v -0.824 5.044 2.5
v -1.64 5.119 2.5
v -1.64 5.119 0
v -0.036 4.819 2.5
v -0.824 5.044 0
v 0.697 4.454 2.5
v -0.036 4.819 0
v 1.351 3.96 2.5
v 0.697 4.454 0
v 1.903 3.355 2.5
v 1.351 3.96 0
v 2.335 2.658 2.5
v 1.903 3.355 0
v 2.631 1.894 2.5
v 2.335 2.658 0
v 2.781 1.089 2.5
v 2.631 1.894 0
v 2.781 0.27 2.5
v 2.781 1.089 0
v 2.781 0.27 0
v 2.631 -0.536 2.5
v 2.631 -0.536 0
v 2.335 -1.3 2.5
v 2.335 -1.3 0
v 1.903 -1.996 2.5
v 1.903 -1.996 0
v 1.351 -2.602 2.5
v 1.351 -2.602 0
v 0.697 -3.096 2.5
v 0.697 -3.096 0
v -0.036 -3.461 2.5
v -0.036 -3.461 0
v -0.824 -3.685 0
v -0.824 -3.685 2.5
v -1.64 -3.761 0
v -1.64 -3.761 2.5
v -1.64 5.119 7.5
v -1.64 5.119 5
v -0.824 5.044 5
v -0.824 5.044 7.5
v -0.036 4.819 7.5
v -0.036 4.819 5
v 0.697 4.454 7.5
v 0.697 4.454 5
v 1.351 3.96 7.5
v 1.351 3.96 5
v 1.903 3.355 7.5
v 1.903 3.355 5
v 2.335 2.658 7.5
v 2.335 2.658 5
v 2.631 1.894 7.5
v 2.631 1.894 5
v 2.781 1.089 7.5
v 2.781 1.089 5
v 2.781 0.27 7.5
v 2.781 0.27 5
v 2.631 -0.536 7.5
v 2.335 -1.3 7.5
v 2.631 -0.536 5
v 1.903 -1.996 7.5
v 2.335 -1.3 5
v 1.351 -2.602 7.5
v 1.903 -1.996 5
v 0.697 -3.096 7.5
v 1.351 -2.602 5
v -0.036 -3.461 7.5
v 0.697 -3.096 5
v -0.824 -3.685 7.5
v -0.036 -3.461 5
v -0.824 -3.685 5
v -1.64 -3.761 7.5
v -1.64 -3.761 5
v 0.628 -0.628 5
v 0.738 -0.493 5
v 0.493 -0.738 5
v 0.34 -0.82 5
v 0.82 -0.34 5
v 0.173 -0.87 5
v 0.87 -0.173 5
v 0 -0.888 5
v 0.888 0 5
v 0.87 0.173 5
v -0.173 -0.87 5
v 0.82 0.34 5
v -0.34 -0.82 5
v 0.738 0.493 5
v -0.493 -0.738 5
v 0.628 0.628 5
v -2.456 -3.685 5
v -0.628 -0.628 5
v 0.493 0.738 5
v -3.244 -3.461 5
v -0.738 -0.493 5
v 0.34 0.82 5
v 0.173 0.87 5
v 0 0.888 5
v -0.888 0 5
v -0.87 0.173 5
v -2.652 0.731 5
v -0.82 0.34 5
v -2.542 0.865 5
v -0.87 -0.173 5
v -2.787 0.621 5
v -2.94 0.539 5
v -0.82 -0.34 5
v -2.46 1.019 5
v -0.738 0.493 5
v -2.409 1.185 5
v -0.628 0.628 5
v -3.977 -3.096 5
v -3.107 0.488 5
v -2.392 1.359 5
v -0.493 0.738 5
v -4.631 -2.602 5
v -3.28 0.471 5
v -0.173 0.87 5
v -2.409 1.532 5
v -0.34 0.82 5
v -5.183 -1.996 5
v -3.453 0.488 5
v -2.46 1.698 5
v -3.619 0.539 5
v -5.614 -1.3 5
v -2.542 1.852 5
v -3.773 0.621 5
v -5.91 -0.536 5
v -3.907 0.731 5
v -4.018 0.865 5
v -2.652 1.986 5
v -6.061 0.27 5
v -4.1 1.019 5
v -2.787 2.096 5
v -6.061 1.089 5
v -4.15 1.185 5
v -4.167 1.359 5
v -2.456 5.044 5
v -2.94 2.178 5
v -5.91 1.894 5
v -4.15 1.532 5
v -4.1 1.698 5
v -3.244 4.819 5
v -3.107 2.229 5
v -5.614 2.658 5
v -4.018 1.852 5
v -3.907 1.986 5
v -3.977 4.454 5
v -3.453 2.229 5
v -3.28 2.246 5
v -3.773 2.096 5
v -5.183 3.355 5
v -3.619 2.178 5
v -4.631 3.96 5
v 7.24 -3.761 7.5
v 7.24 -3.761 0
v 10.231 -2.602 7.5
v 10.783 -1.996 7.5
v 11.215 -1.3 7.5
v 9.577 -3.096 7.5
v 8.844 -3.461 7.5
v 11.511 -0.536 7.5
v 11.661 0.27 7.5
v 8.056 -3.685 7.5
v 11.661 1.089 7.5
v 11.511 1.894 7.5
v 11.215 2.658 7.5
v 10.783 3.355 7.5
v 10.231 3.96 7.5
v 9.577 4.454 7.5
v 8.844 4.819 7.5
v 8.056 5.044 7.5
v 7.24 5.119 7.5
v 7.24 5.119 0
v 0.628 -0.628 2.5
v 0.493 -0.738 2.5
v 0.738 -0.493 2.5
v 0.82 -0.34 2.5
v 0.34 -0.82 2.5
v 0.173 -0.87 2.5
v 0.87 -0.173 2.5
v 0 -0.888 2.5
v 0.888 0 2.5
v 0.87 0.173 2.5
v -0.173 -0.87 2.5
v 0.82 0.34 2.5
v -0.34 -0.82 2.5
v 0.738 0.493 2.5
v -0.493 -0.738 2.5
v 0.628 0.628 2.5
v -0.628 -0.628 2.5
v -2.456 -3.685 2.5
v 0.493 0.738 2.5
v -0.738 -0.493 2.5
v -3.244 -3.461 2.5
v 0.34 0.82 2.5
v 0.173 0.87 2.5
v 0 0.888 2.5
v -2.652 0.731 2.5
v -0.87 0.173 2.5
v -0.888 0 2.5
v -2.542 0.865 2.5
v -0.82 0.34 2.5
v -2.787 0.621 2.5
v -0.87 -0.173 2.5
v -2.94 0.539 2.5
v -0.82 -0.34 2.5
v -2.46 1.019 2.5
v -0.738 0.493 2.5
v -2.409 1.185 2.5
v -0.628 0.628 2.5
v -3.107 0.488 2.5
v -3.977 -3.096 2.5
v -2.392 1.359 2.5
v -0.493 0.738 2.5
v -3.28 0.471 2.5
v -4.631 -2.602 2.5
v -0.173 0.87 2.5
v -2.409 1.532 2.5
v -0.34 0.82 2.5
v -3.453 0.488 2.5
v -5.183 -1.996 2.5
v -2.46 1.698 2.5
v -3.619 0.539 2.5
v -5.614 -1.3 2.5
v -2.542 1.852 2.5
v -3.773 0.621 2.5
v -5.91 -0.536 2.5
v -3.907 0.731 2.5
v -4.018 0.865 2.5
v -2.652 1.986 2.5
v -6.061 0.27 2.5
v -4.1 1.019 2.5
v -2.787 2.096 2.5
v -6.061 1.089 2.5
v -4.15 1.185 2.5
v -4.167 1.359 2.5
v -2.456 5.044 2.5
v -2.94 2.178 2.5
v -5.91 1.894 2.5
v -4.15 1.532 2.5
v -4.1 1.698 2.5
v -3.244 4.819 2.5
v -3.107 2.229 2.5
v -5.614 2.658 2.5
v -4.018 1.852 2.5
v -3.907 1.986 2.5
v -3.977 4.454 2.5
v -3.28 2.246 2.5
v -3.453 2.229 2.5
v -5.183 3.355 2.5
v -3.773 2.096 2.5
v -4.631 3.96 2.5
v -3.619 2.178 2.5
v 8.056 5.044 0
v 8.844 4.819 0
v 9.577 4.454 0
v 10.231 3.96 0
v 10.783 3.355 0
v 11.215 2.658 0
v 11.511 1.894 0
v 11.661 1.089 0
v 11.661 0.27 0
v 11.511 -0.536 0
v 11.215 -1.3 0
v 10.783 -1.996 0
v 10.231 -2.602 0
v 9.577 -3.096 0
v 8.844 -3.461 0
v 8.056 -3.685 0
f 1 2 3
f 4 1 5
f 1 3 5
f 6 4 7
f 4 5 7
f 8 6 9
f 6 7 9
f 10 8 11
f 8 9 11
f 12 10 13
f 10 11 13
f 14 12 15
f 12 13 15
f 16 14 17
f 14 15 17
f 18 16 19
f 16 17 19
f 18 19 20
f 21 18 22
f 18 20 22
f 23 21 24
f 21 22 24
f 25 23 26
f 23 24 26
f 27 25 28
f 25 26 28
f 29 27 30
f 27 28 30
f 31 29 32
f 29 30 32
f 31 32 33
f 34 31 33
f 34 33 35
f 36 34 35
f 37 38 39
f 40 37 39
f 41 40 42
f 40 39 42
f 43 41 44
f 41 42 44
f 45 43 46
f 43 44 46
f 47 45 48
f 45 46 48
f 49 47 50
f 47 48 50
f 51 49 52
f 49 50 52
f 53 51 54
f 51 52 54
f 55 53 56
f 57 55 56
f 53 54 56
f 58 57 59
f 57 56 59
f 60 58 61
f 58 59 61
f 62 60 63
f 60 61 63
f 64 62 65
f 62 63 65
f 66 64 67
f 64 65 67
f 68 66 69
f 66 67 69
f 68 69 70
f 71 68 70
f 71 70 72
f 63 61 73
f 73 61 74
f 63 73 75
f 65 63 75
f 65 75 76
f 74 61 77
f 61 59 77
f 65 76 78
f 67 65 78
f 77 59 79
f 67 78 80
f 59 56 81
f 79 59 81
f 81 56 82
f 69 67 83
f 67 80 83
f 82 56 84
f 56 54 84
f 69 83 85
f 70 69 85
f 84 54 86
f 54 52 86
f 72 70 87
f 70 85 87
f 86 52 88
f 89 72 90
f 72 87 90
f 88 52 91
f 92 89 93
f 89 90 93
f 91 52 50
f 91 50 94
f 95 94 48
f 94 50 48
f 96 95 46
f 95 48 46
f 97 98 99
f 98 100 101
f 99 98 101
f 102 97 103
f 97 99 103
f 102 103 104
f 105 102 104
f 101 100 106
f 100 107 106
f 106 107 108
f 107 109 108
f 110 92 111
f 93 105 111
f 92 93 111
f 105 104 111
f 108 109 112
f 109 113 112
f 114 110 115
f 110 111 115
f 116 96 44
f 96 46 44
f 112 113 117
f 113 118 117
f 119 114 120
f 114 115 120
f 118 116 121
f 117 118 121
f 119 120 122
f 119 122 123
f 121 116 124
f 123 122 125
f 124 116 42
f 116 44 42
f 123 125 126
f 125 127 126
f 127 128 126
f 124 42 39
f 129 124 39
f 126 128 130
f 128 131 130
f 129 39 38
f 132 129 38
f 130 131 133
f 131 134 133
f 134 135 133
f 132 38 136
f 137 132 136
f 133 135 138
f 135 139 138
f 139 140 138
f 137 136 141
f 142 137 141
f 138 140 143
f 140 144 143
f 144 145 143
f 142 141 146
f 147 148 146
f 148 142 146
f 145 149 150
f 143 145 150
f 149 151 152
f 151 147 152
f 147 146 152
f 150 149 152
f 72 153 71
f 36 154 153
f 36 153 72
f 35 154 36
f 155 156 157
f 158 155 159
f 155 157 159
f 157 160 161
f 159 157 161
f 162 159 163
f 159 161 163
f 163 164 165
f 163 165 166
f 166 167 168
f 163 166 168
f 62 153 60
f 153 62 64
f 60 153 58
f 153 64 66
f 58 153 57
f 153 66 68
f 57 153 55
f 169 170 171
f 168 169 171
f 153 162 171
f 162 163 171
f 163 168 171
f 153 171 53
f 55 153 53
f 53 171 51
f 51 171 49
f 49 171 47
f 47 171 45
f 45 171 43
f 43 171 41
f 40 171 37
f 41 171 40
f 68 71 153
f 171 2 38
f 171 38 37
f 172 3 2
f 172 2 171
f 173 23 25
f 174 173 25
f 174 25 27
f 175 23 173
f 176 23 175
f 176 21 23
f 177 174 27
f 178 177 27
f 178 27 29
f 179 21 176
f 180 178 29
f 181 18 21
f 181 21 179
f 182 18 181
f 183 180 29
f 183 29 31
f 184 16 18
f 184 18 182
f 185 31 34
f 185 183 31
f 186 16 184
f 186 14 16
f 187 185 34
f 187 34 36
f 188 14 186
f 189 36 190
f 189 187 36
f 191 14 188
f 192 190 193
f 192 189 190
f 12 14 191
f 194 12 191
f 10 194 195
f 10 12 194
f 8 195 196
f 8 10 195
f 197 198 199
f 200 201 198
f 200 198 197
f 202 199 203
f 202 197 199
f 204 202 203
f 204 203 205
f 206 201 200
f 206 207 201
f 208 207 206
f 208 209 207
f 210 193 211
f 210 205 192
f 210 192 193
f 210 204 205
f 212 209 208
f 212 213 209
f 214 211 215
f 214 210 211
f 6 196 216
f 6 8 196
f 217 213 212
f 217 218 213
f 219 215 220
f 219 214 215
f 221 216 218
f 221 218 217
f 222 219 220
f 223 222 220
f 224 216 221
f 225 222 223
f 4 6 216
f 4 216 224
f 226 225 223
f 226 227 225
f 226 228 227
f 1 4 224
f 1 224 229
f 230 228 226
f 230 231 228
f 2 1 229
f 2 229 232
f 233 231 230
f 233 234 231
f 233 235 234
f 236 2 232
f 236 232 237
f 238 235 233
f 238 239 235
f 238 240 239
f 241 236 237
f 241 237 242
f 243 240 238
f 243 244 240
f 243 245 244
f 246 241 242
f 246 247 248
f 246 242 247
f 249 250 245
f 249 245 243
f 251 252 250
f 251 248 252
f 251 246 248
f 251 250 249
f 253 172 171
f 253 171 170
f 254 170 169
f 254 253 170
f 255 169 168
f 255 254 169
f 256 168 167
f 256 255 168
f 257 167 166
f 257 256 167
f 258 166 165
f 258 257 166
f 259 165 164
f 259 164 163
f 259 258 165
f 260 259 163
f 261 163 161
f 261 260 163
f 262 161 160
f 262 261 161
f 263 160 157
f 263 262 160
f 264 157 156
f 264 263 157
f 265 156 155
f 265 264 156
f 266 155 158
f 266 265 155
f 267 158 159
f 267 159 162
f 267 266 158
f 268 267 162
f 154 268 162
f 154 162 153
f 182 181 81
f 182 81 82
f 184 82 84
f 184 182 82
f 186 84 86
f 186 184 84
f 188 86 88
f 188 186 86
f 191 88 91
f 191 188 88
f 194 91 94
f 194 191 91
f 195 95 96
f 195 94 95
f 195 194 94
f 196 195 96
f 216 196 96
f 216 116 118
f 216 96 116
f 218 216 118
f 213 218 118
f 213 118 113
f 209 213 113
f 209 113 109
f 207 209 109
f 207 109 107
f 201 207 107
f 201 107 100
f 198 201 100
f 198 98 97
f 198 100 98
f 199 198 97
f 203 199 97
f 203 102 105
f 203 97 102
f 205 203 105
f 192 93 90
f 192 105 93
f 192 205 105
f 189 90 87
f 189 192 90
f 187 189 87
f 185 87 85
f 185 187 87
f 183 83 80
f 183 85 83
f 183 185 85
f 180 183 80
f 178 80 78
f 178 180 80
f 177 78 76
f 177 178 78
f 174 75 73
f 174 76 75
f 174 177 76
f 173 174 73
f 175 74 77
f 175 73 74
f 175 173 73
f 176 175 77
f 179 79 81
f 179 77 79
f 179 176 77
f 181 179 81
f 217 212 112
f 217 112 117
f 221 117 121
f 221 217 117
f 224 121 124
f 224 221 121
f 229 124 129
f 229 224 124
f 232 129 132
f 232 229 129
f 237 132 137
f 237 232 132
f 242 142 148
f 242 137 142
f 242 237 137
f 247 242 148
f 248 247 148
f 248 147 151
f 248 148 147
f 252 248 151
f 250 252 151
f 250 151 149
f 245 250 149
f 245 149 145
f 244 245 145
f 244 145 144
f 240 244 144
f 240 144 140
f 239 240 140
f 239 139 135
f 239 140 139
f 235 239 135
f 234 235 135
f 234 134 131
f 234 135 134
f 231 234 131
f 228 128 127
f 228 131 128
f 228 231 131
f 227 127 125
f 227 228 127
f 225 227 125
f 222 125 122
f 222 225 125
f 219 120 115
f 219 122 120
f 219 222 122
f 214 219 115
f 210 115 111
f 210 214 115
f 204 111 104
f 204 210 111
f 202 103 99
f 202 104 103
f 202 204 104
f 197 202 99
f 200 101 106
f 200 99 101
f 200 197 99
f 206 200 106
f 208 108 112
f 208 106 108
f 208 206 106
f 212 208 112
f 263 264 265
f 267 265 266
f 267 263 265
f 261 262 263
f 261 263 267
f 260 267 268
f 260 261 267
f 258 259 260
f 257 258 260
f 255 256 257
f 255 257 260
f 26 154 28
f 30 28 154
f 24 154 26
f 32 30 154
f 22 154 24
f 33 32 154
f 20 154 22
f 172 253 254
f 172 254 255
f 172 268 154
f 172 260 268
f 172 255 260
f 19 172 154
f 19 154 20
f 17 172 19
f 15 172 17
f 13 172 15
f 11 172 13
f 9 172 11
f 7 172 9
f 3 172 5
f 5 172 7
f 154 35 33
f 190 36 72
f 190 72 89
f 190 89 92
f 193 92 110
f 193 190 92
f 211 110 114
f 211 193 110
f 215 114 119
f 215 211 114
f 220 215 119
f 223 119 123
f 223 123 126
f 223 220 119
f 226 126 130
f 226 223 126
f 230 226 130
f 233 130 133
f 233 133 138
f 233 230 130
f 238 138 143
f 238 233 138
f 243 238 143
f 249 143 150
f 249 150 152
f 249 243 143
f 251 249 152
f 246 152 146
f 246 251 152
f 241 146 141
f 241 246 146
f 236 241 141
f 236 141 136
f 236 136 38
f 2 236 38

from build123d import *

# Parameters (mm, degrees)
SKETCH1_R           = 0.8875
BOSS_EXTRUDE1_DEPTH = 7.5
SKETCH2_R           = 4.44
CUT_EXTRUDE1_DEPTH  = 2.5
CUT_EXTRUDE2_START  = -5
SKETCH2_2_R         = 4.44
CUT_EXTRUDE2_DEPTH  = 2.5


with BuildPart() as part:
    # Sketch1 → Boss-Extrude1 (new body)
    with BuildSketch(Plane.XY):
        with BuildLine():
            Line((-1.63988617, 5.119263092), (7.24011383, 5.119263092))
            ThreePointArc((7.24011383, 5.119263092), (11.68011383, 0.679263092), (7.24011383, -3.760736908))
            Line((7.24011383, -3.760736908), (-1.63988617, -3.760736908))
            ThreePointArc((-1.63988617, -3.760736908), (-6.07988617, 0.679263092), (-1.63988617, 5.119263092))
        make_face()
        Circle(SKETCH1_R, mode=Mode.SUBTRACT)
        with Locations((-3.27977234, 1.358526185)):
            Circle(SKETCH1_R, mode=Mode.SUBTRACT)
    extrude(amount=BOSS_EXTRUDE1_DEPTH)

    # Sketch2 → Cut-Extrude1 (cut)
    with BuildSketch(Plane(origin=(0, 0, 0), x_dir=(-1, 0, 0), z_dir=(0, 0, -1))):
        with Locations((1.63988617, 0.679263092)):
            Circle(SKETCH2_R)
    extrude(amount=-CUT_EXTRUDE1_DEPTH, mode=Mode.SUBTRACT)

    # Sketch2<2> → Cut-Extrude2 (cut)
    with BuildSketch(Plane(origin=(0, 0, 0), x_dir=(-1, 0, 0), z_dir=(0, 0, -1)).offset(CUT_EXTRUDE2_START)):
        with Locations((1.63988617, 0.679263092)):
            Circle(SKETCH2_2_R)
    extrude(amount=-CUT_EXTRUDE2_DEPTH, mode=Mode.SUBTRACT)


solid = part.part
